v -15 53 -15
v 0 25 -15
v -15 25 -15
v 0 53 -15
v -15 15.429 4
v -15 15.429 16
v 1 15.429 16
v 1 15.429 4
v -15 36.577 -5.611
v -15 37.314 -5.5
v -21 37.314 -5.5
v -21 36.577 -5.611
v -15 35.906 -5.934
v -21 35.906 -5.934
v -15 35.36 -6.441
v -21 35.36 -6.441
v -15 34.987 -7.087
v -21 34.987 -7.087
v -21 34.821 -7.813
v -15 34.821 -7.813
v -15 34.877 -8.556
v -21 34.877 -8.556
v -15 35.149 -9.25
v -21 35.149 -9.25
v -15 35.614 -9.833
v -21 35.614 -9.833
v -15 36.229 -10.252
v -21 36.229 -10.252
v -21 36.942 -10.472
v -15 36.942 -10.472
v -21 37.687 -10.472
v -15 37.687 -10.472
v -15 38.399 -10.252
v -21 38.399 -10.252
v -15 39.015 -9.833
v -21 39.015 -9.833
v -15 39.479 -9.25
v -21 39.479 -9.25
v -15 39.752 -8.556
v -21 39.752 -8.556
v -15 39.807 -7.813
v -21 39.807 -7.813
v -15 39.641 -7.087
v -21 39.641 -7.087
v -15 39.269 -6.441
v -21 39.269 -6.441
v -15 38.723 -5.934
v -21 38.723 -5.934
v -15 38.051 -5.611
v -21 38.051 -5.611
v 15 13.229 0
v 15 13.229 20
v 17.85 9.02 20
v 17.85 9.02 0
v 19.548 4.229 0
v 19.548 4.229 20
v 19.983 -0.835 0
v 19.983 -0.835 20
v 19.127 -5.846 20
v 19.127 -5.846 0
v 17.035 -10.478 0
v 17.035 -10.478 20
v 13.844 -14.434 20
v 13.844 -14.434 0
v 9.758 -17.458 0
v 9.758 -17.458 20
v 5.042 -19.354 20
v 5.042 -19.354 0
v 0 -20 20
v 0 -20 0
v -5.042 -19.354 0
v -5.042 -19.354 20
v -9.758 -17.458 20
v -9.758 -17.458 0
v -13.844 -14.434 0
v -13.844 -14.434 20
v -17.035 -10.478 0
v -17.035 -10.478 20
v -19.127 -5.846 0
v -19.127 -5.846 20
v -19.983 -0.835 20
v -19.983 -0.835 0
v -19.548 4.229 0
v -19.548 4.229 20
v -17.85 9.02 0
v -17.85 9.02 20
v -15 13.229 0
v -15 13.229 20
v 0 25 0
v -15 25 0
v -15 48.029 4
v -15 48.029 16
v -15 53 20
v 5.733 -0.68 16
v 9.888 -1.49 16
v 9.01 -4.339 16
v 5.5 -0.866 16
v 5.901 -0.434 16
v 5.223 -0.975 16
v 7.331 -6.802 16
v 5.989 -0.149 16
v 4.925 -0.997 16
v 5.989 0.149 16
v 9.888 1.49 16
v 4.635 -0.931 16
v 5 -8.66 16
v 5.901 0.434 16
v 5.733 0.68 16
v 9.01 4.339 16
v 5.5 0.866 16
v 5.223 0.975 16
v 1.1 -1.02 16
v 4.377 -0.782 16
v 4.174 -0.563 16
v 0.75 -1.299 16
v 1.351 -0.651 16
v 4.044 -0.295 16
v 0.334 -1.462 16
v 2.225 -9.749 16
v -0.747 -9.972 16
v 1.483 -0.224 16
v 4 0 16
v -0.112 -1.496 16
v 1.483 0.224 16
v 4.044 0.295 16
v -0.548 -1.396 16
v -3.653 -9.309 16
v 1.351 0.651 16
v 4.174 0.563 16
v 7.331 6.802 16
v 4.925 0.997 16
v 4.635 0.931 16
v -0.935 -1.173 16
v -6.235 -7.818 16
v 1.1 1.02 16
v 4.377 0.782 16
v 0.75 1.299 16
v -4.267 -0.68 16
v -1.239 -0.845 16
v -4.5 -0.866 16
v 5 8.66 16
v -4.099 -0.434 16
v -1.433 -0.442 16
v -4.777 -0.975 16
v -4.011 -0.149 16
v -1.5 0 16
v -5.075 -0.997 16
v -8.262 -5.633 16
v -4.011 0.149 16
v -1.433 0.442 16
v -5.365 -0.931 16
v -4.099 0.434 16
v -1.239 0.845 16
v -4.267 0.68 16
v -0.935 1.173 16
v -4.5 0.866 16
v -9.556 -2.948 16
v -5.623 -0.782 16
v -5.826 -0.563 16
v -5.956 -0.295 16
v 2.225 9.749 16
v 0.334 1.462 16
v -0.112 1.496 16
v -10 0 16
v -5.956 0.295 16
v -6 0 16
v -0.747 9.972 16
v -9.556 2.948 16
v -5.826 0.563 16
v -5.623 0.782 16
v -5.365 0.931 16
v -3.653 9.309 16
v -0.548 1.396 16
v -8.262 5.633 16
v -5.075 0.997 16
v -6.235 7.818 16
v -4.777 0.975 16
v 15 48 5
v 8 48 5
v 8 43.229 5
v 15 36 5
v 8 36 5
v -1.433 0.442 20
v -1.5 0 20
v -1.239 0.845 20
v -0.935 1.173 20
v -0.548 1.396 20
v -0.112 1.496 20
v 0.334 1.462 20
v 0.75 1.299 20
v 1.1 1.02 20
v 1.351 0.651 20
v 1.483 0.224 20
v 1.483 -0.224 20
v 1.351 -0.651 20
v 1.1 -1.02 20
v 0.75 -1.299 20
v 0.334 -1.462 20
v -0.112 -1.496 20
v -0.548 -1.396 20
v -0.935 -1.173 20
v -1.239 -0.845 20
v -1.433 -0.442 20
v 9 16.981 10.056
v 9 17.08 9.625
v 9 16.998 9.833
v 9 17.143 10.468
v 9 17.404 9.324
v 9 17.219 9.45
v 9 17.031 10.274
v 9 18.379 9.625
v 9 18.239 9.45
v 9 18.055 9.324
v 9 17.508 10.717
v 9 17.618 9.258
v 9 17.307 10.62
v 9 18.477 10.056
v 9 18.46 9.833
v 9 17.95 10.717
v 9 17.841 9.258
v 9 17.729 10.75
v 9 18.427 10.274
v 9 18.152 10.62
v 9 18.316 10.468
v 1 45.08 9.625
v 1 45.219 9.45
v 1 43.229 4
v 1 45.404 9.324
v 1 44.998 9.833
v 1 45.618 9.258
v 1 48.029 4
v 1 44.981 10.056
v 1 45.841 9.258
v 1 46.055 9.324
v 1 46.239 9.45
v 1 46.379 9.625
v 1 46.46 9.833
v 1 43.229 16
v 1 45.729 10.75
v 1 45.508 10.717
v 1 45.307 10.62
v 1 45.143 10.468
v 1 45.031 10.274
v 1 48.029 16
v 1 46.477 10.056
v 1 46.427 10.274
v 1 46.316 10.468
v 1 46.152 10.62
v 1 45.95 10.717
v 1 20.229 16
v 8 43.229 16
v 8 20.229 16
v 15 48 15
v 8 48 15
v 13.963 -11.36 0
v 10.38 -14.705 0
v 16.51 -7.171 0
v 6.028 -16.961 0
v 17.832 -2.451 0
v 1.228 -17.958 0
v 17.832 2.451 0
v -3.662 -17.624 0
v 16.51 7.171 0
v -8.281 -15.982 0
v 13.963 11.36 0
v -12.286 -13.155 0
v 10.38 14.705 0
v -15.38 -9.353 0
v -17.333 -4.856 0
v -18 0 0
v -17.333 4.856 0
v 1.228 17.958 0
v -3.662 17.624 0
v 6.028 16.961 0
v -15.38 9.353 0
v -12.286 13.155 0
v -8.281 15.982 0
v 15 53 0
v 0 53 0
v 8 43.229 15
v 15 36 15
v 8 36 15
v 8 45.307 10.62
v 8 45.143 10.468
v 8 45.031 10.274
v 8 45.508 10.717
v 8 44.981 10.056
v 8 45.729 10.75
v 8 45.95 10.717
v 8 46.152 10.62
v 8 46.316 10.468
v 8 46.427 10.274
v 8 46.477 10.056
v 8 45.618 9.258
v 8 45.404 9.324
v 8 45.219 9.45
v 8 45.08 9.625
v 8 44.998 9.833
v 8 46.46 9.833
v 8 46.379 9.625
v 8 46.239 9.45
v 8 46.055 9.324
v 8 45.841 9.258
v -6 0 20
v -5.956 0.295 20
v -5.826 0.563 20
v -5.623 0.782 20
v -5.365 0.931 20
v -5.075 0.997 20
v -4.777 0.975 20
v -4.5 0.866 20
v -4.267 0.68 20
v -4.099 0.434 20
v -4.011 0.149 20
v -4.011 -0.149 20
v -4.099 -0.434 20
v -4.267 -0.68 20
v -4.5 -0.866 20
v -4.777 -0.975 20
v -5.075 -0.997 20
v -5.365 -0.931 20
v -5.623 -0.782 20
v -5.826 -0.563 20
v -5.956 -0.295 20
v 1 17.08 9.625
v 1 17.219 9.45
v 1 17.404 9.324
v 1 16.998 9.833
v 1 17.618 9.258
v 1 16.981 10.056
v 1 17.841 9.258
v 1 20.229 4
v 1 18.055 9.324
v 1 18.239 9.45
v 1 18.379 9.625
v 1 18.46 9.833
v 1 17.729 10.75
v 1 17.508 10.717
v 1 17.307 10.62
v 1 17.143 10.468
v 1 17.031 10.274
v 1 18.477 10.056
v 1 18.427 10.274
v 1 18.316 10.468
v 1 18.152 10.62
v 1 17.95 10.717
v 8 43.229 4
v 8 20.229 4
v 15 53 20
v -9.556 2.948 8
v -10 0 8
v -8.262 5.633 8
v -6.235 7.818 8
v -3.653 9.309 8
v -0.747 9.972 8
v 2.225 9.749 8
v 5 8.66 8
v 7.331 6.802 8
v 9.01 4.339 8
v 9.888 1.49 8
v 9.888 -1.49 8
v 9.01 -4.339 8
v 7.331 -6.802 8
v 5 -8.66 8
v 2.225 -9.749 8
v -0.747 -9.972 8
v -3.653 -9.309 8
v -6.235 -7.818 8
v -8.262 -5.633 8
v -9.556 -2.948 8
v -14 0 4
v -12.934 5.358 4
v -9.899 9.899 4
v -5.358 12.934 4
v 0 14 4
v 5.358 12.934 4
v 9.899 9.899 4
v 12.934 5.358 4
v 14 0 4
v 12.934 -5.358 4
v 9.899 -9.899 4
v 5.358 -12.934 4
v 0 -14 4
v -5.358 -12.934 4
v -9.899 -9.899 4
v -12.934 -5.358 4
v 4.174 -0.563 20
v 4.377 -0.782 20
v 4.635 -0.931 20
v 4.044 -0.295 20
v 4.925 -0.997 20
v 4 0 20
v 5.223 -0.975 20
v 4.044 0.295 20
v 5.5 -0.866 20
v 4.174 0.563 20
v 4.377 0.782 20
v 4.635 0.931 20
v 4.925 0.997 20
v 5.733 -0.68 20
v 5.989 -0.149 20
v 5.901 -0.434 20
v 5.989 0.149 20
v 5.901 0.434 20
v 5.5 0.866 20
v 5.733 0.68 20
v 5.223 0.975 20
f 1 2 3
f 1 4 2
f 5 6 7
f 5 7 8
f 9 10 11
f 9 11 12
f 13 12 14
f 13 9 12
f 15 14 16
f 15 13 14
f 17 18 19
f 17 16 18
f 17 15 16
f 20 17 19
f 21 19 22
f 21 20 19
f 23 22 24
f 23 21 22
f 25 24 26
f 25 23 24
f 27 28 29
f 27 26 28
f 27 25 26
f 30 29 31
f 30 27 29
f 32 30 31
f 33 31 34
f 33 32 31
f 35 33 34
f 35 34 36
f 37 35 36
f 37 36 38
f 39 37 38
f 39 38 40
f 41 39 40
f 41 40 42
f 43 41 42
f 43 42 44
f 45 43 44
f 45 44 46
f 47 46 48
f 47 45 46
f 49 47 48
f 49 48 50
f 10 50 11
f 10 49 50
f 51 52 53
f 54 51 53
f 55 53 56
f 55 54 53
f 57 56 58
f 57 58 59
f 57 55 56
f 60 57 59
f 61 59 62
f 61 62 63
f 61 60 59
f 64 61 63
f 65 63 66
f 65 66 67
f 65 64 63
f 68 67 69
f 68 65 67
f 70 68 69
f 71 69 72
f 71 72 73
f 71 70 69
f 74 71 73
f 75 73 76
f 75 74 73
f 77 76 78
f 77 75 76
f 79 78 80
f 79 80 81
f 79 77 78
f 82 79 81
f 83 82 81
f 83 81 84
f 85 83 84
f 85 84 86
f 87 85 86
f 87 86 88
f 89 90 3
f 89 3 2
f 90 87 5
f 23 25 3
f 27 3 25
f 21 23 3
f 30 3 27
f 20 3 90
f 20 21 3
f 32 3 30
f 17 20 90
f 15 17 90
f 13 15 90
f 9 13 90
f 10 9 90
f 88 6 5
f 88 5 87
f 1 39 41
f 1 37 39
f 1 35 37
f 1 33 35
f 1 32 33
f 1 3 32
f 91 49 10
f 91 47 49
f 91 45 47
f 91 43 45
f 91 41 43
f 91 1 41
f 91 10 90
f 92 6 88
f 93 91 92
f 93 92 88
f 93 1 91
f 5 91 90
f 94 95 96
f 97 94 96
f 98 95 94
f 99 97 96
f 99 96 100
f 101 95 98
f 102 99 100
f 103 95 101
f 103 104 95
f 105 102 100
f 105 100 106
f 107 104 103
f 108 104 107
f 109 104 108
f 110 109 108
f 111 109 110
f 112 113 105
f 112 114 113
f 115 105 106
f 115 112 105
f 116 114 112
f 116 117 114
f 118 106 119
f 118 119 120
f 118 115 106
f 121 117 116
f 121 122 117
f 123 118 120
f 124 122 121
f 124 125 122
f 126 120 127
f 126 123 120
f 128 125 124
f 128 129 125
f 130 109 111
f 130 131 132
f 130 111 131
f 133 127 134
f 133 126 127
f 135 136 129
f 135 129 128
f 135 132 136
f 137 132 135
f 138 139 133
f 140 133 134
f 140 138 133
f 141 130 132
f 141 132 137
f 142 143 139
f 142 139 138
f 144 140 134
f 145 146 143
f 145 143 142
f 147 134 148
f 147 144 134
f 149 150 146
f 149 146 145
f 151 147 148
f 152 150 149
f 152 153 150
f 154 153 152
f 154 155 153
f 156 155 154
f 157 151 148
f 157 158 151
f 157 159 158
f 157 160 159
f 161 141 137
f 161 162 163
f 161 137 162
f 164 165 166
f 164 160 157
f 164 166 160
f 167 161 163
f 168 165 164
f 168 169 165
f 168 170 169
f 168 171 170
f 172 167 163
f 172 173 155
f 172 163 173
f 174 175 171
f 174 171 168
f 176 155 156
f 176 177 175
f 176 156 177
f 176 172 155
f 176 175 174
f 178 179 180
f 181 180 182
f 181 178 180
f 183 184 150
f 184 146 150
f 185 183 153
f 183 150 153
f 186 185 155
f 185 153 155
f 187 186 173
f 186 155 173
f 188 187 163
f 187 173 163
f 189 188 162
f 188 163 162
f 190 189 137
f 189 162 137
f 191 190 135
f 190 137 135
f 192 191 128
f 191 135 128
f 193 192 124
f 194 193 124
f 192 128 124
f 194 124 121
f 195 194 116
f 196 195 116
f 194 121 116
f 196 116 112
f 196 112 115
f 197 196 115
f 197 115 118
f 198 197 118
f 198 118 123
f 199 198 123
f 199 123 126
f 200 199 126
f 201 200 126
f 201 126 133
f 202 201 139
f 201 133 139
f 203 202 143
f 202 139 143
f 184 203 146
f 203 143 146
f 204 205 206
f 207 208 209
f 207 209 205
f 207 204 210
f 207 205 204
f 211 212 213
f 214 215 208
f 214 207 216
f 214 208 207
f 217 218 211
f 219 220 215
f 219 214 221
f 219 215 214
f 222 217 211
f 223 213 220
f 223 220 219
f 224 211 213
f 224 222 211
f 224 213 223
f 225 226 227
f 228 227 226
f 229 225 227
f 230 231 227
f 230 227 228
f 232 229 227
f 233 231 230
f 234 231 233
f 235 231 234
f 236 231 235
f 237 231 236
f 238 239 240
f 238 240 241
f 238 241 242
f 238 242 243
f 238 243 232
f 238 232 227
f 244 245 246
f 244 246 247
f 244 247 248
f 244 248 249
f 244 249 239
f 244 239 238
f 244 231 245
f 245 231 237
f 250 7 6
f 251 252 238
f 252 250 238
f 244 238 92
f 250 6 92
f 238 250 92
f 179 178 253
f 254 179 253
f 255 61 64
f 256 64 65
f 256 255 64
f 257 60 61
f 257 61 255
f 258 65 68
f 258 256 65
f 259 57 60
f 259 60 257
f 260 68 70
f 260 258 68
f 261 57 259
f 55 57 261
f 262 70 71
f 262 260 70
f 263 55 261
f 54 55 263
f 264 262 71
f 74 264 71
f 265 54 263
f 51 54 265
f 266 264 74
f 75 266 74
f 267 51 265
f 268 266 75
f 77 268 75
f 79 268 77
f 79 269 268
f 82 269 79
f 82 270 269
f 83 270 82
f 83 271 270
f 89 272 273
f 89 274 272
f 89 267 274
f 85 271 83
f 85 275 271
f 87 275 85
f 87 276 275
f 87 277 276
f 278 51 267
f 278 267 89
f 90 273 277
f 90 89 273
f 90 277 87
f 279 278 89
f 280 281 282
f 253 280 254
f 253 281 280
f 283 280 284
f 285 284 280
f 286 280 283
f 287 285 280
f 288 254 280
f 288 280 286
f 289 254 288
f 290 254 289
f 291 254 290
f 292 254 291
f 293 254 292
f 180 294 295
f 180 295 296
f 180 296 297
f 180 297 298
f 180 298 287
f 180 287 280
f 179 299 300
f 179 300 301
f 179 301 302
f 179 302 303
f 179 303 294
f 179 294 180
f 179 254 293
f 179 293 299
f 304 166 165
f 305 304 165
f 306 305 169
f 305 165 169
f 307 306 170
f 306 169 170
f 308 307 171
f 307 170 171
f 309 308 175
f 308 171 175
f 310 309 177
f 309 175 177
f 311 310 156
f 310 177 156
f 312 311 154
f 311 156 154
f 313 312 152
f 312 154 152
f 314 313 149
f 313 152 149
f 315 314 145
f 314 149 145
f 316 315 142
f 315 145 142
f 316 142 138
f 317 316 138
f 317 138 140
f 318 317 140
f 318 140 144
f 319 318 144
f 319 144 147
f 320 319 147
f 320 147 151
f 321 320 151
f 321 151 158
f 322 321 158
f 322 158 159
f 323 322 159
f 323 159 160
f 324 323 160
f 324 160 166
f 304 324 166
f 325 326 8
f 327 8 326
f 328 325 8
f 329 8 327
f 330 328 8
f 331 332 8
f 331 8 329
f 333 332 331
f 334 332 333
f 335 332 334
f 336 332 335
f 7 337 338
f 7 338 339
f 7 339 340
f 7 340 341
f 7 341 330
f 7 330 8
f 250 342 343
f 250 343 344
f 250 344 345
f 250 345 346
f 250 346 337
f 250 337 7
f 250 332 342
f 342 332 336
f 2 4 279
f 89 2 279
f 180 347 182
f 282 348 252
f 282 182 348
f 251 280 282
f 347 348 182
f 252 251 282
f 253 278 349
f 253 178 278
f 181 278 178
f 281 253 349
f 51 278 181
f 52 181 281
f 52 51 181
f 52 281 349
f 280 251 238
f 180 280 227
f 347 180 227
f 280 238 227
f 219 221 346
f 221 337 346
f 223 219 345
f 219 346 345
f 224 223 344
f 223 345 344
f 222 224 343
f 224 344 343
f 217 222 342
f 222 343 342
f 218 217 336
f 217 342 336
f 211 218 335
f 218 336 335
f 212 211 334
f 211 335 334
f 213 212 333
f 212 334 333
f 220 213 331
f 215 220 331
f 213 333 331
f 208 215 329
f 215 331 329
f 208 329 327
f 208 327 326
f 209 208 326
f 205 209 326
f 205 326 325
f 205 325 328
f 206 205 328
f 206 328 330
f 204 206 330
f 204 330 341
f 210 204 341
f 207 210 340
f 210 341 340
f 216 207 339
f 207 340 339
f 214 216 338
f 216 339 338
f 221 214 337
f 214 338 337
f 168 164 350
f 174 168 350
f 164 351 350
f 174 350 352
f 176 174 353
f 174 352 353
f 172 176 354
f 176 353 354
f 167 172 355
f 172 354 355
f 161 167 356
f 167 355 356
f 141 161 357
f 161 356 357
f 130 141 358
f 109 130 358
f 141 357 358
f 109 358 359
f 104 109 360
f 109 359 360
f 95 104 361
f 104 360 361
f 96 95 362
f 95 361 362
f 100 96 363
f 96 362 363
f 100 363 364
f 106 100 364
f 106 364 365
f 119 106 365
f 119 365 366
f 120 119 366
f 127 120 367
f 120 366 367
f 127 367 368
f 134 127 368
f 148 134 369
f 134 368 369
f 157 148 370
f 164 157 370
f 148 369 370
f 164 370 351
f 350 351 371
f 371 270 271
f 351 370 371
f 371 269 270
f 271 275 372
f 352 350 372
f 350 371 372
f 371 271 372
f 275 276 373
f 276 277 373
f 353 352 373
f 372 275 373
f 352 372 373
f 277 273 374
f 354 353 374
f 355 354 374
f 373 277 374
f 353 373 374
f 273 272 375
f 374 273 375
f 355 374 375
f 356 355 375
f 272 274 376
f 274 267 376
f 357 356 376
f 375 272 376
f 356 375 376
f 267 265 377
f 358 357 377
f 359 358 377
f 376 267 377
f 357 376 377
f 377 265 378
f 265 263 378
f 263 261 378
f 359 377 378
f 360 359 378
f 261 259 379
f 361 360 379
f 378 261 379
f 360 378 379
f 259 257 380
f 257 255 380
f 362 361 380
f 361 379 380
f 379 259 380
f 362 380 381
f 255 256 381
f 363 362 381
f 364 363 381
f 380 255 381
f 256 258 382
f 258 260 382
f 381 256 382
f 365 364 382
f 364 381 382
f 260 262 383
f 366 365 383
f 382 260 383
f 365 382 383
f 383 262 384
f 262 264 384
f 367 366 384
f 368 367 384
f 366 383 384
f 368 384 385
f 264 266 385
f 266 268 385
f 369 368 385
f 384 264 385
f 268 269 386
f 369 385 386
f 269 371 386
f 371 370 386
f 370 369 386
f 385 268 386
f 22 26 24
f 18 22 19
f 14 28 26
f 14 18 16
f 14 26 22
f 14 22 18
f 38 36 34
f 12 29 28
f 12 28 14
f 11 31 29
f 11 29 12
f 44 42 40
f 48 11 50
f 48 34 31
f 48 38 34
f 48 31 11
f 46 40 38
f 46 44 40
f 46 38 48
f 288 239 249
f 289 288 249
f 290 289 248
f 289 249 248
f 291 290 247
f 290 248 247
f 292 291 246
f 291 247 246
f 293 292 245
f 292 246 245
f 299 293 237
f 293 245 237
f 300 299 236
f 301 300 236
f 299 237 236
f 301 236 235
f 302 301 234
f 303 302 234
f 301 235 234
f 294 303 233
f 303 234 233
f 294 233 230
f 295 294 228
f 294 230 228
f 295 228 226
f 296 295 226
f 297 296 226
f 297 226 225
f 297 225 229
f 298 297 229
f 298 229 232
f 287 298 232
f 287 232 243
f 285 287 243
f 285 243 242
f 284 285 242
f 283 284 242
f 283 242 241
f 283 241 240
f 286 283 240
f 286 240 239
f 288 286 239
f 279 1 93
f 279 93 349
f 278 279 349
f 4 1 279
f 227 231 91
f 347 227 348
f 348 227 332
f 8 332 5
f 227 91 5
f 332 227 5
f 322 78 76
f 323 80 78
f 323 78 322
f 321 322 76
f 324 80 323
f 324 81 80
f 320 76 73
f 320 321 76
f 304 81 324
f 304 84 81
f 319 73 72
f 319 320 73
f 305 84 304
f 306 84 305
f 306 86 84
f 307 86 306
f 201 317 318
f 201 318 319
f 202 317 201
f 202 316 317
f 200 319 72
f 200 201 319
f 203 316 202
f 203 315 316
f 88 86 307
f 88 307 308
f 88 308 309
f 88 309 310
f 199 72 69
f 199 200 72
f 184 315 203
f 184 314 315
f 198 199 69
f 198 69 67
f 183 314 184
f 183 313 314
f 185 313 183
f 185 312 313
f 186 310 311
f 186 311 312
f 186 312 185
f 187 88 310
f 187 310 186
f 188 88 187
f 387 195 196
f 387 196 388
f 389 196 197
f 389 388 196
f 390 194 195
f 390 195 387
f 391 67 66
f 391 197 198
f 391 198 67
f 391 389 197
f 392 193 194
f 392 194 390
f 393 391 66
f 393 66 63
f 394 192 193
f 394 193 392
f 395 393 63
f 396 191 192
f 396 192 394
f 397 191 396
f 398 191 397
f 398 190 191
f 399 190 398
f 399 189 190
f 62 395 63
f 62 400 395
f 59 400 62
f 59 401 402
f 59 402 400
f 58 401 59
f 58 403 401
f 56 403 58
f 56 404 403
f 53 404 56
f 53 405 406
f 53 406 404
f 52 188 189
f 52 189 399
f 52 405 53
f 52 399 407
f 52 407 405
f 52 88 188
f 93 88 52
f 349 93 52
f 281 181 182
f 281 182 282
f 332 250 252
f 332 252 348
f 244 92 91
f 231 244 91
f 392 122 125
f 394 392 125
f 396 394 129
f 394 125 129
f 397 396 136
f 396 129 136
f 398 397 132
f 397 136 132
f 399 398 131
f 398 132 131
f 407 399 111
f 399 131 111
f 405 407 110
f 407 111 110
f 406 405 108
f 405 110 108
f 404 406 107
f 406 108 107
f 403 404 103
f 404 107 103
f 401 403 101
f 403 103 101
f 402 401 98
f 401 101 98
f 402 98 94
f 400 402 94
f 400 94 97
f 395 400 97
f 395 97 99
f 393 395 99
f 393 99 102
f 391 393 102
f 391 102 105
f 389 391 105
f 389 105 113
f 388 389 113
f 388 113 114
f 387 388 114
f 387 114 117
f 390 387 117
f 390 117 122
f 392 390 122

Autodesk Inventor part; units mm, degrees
ref_plane "YZ Plane" through (0, 0, 0) normal (1, 0, 0) x (0, 1, 0)
ref_plane "XZ Plane" through (0, 0, 0) normal (0, 1, 0) x (-1, 0, 0)
ref_plane "XY Plane" through (0, 0, 0) normal (0, 0, 1) x (1, 0, 0)
sketch "Sketch1" plane through (0, 0, 0) normal (0, 0, 1) x (1, 0, 0)
  circle A0 centre (0, 0) radius 10
  circle A1 centre (0, 0) radius 20
  line L0 (-15, 0) -> (15, 0)
  line L1 (15, 0) -> (15, 50)
  line L2 (15, 50) -> (-15, 50)
  line L3 (-15, 50) -> (-15, 0)
  point P0 (-15, 13.2288)
  point P1 (15, 13.2288)
  dimension "d0" = 20
  dimension "d1" = 40
  dimension "d2" = 30
  dimension "d3" = 50
extrude "Extrusion1" add sketch "Sketch1" along normal blind 20
sketch "Sketch2" plane through (0, 0, 20) normal (0, 0, 1) x (1, 0, 0)
  circle A0 centre (0, 0) radius 10
  dimension "d6" = 20
extrude "Extrusion2" cut sketch "Sketch2" against normal blind 15
sketch "Sketch4" plane through (-15, 13.2288, 0) normal (-1, 0, 0) x (0, 0, 1)
  line L0 (0, 36.7712) -> (20, 36.7712) projected
  line L1 (0, 0) -> (0, 36.7712) projected
  line L2 (20, 36.7712) -> (0, 36.7712)
  line L3 (0, 36.7712) -> (0, 0)
  line L4 (0, 0) -> (20, 0)
  line L5 (20, 0) -> (20, 36.7712)
  line L6 (0, 0) -> (20, 0) projected
  line L7 (20, 36.7712) -> (10, 36.7712)
  line L8 (10, 36.7712) -> (10, 0)
  line L9 (10, 0) -> (20, 0)
  line L10 (20, 0) -> (20, 36.7712)
  line L11 (10, 0) -> (16, 0)
  line L12 (16, 0) -> (16, 25)
  line L13 (16, 25) -> (10, 25)
  line L14 (10, 25) -> (10, 0)
  line L15 (10, 25) -> (4, 25)
  line L16 (4, 25) -> (4, 0)
  line L17 (4, 0) -> (10, 0)
  line L18 (10, 0) -> (10, 25)
  line L19 (4, 25) -> (16, 25)
  line L20 (16, 25) -> (16, 30.0005)
  line L21 (16, 30.0005) -> (4, 30.0005)
  line L22 (4, 30.0005) -> (4, 25)
  line L23 (4, 30.0005) -> (16, 30.0005)
  line L24 (16, 30.0005) -> (16, 7.0005)
  line L25 (16, 7.0005) -> (4, 7.0005)
  line L26 (4, 7.0005) -> (4, 30.0005)
  line L27 (10, 7.0005) -> (16, 7.0005)
  line L28 (16, 7.0005) -> (16, 0)
  line L29 (16, 0) -> (10, 0)
  line L30 (10, 0) -> (10, 7.0005)
  point P0 (0, -13.2288)
  dimension "d13" = 6
  dimension "d14" = 25
  dimension "d15" = 6
  dimension "d16" = 23
extrude "Extrusion3" cut sketch "Sketch4" against normal blind 23 contours L21 L20 L13 L8 | L8 L15 L22 L21 | L13 L12 L25 L8 | L8 L25 L16 L15
sketch "Sketch6" plane through (-15, 13.2288, 0) normal (-1, 0, 0) x (0, 0, 1)
  line L0 (4, 7.0005) -> (4, 30.0005) projected
  line L1 (4, 7.0005) -> (16, 7.0005)
  line L2 (16, 7.0005) -> (16, 2.2005)
  line L3 (16, 2.2005) -> (4, 2.2005)
  line L4 (4, 2.2005) -> (4, 7.0005)
  line L5 (4, 30.0005) -> (16, 30.0005)
  line L6 (16, 30.0005) -> (16, 34.8005)
  line L7 (16, 34.8005) -> (4, 34.8005)
  line L8 (4, 34.8005) -> (4, 30.0005)
  point P0 (0, -13.2288)
  dimension "d19" = 12
  dimension "d20" = 4.8
  dimension "d21" = 4.8
extrude "Extrusion4" cut sketch "Sketch6" against normal blind 16
sketch "Sketch7" plane through (1, 13.2288, 0) normal (-1, 0, 0) x (0, 0, 1)
  line L0 (4, 30.0005) -> (16, 30.0005) projected
  line L1 (4, 30.0005) -> (10, 30.0005)
  line L2 (10, 30.0005) -> (10, 32.5005)
  line L3 (10, 32.5005) -> (4, 32.5005)
  line L4 (4, 32.5005) -> (4, 30.0005)
  circle A0 centre (10, 32.5005) radius 0.75
  line L5 (16, 7.0005) -> (4, 7.0005) projected
  line L6 (16, 7.0005) -> (16, 2.2005) projected
  line L7 (4, 7.0005) -> (16, 7.0005)
  line L8 (16, 7.0005) -> (16, 4.5005)
  line L9 (16, 4.5005) -> (4, 4.5005)
  line L10 (4, 4.5005) -> (4, 7.0005)
  line L11 (10, 4.5005) -> (4, 4.5005)
  line L12 (4, 4.5005) -> (4, 7.0005)
  line L13 (4, 7.0005) -> (10, 7.0005)
  line L14 (10, 7.0005) -> (10, 4.5005)
  circle A1 centre (10, 4.5005) radius 0.75
  point P0 (0, -13.2288)
  dimension "d24" = 2.5
  dimension "d25" = 1.5
  dimension "d26" = 2.5
  dimension "d27" = 1.5
extrude "Extrusion5" cut sketch "Sketch7" against normal blind 8 contours A0 L3 L2 | L2 L3 A0 | A1 L9 L14 | L14 L9 A1 | A1 L9
sketch "Sketch8" plane through (15, 13.2288, 0) normal (1, 0, 0) x (0, 0, -1)
  line L0 (0, 36.7712) -> (0, 0) projected
  line L1 (-20, 36.7712) -> (-20, 0) projected
  line L2 (0, 36.7712) -> (-20, 36.7712)
  line L3 (-20, 36.7712) -> (-20, 26.7712)
  line L4 (-20, 26.7712) -> (0, 26.7712)
  line L5 (0, 26.7712) -> (0, 36.7712)
  line L6 (0, 26.7712) -> (-20, 26.7712)
  line L7 (-20, 26.7712) -> (-20, 18.7712)
  line L8 (-20, 18.7712) -> (0, 18.7712)
  line L9 (0, 18.7712) -> (0, 26.7712)
  line L10 (0, 26.7712) -> (-10, 26.7712)
  line L11 (-10, 26.7712) -> (-10, 18.7712)
  line L12 (-10, 18.7712) -> (0, 18.7712)
  line L13 (0, 18.7712) -> (0, 26.7712)
  line L14 (-10, 26.7712) -> (-5, 26.7712)
  line L15 (-5, 26.7712) -> (-5, 22.7712)
  line L16 (-5, 22.7712) -> (-10, 22.7712)
  line L17 (-10, 22.7712) -> (-10, 26.7712)
  line L18 (-10, 22.7712) -> (-15, 22.7712)
  line L19 (-15, 22.7712) -> (-15, 26.7712)
  line L20 (-15, 26.7712) -> (-10, 26.7712)
  line L21 (-10, 26.7712) -> (-10, 22.7712)
  point P0 (0, -13.2288)
  dimension "d30" = 10
  dimension "d31" = 8
  dimension "d32" = 5
  dimension "d33" = 5
extrude "Extrusion6" cut sketch "Sketch8" against normal blind 15.8125 contours L15 L16 L11 L4 | L11 L18 L19 L4
sketch "Sketch9" plane through (0, 0, 5) normal (0, 0, 1) x (1, 0, 0)
  circle A0 centre (0, 0) radius 1
  circle A1 centre (7, 0) radius 1.5
  circle A2 centre (0, 0) radius 1.5
  circle A3 centre (-7, 0) radius 1.5
  dimension "d36" = 2
  dimension "d37" = 3
  dimension "d38" = 3
  dimension "d39" = 3
extrude "Extrusion7" cut sketch "Sketch9" against normal blind 8 contours A0 | A1 | A2 | A3
sketch "Sketch10" plane through (-15, 50, 0) normal (0, 1, 0) x (1, 0, 0)
  line L0 (0, 0) -> (0, -20) projected
  line L1 (0, 0) -> (29.4792, 0)
  line L2 (29.4792, 0) -> (29.4792, -20)
  line L3 (29.4792, -20) -> (0, -20)
  line L4 (0, -20) -> (0, 0)
  point P0 (15, 0)
extrude "Extrusion8" add sketch "Sketch10" along normal blind 10
sketch "Sketch11" plane through (0, 0, 0) normal (0, 0, -1) x (-1, 0, 0)
  line L0 (15, 13.2288) -> (15, 60) projected
  line L1 (-15, 13.2288) -> (-15, 50) projected
  line L2 (15, 60) -> (-15, 60)
  line L3 (-15, 60) -> (-15, 45)
  line L4 (-15, 45) -> (15, 45)
  line L5 (15, 45) -> (15, 60)
  line L6 (15, 45) -> (-15, 45)
  line L7 (-15, 45) -> (-15, 35)
  line L8 (-15, 35) -> (15, 35)
  line L9 (15, 35) -> (15, 45)
  point P0 (0, 0)
  dimension "d47" = 15
  dimension "d48" = 10
sketch "Sketch12" plane through (14.4792, 50, 20) normal (1, 0, 0) x (0, 0, -1)
  line L0 (20, 0) -> (20, 10) projected
  line L1 (0, 0) -> (20, 0)
  line L2 (20, 0) -> (20, 10)
  line L3 (20, 10) -> (0, 10)
  line L4 (0, 10) -> (0, 0)
  point P0 (20, -50)
extrude "Extrusion9" cut sketch "Sketch12" against normal blind 59.6125
sketch "Sketch13" plane through (-15, 50, 0) normal (0, 1, 0) x (1, 0, 0)
  line L0 (30, 0) -> (30, -20) projected
  line L1 (0, 0) -> (30, 0)
  line L2 (30, 0) -> (30, -20)
  line L3 (30, -20) -> (0, -20)
  line L4 (0, -20) -> (0, 0)
  point P0 (15, 0)
extrude "Extrusion10" add sketch "Sketch13" along normal blind 10
extrude "Extrusion11" add sketch "Sketch11" along normal blind 10
sketch "Sketch15" plane through (0, 0, 20) normal (0, 0, 1) x (1, 0, 0)
  line L0 (-15, 60) -> (15, 60) projected
  line L1 (-15, 60) -> (0, 60)
  line L2 (0, 60) -> (0, 35)
  line L3 (0, 35) -> (-15, 35)
  line L4 (-15, 35) -> (-15, 60)
  point P0 (0, 0)
  dimension "d56" = 25
extrude "Extrusion12" add sketch "Sketch15" along normal blind 10
sketch "Sketch16" plane through (0, 0, -10) normal (0, 0, -1) x (-1, 0, 0)
  line L0 (-15, 13.2288) -> (-15, 60) projected
  line L1 (0, 35) -> (15, 35) projected
  line L2 (-15, 60) -> (0, 60)
  line L3 (0, 60) -> (0, 35)
  line L4 (0, 35) -> (-15, 35)
  line L5 (-15, 35) -> (-15, 60)
  point P0 (0, 0)
extrude "Extrusion13" cut sketch "Sketch16" against normal blind 10
sketch "Sketch18" plane through (0, 0, 20) normal (0, 0, 1) x (1, 0, 0)
  circle A0 centre (0, 0) radius 10
extrude "Extrusion15" add sketch "Sketch18" against normal blind 16
sketch "Sketch19" plane through (0, 0, 0) normal (0, 0, -1) x (-1, 0, 0)
  circle A0 centre (0, 0) radius 1.5 projected
  circle A1 centre (0, 0) radius 10
  dimension "d72" = 20
extrude "Extrusion16" cut sketch "Sketch19" against normal blind 16
sketch "Sketch20" plane through (0, 0, 4) normal (0, 0, -1) x (-1, 0, 0)
  circle A0 centre (0, 0) radius 1.5 projected
  circle A1 centre (0, 0) radius 1.5
extrude "Extrusion17" cut sketch "Sketch20" against normal blind 30.0375
sketch "Sketch21" plane through (0, 0, 16) normal (0, 0, -1) x (-1, 0, 0)
  circle A0 centre (5, 0) radius 1
  circle A1 centre (-5, 0) radius 1
  point P0 (0, 0)
  dimension "d77" = 2
  dimension "d78" = 2
extrude "Extrusion18" cut sketch "Sketch21" against normal blind 138.2375
chamfer "Chamfer2" distance 8 angle 45 1 edges at (10, 0, 0)
sketch "Sketch22" plane through (-15, 13.2288, 0) normal (-1, 0, 0) x (0, 0, 1)
  circle A0 centre (-4, 36.7712) radius 2 projected
  circle A1 centre (-4, 36.7712) radius 2
  circle A2 centre (24, 36.7712) radius 2 projected
  circle A3 centre (24, 36.7712) radius 2
  point P0 (0, -13.2288)
sketch "Sketch25" plane through (-15, 13.2288, 0) normal (-1, 0, 0) x (0, 0, 1)
  circle A0 centre (-4, 36.7712) radius 2 projected
  circle A1 centre (-4, 36.7712) radius 8
  arc A2 (7.7087, 23.1005) -> (12.2913, 23.1005) centre (10, 24.1005) ccw projected
  circle A3 centre (10, 24.1005) radius 8
  circle A4 centre (24, 36.7712) radius 2 projected
  circle A5 centre (24, 36.7712) radius 8
  circle A6 centre (-4, 36.7712) radius 2
  circle A7 centre (24, 36.7712) radius 2
  line L0 (-4, 36.7712) -> (24.7591, 36.7712)
  line L1 (24.7591, 36.7712) -> (24.7591, 61.7712)
  line L2 (24.7591, 61.7712) -> (-4, 61.7712)
  line L3 (-4, 61.7712) -> (-4, 36.7712)
  point P0 (0, -13.2288)
  dimension "d92" = 16
  dimension "d93" = 16
  dimension "d94" = 16
  dimension "d99" = 25
sketch "Sketch29" plane through (-15, 15.4292, 4) normal (0, 0, 1) x (1, 0, 0)
  point P0 (15, -15.4292)
sketch "Sketch33" plane through (15, 13.2288, 20) normal (1, 0, 0) x (0, 0, -1)
  line L0 (5, 26.7712) -> (5, 22.7712) projected
  line L1 (5, 26.7712) -> (15, 26.7712)
  line L2 (15, 26.7712) -> (15, 34.7712)
  line L3 (15, 34.7712) -> (5, 34.7712)
  line L4 (5, 34.7712) -> (5, 26.7712)
  point P0 (20, -13.2288)
  dimension "d110" = 10
  dimension "d111" = 8
extrude "Extrusion27" cut sketch "Sketch33" against normal blind 7
sketch "Sketch34" plane through (0, 0, 30) normal (0, 0, 1) x (1, 0, 0)
  point P0 (0, 0)
sketch "Sketch37" plane through (0, 0, 30) normal (0, 0, 1) x (1, 0, 0)
  point P0 (0, 0)
sketch "Sketch38" plane through (-15, 13.2288, 0) normal (-1, 0, 0) x (0, 0, 1)
  point P0 (0, -13.2288)
sketch "Sketch41" plane through (-15, 13.2288, 0) normal (-1, 0, 0) x (0, 0, 1)
  line L0 (30, 21.7712) -> (30, 46.7712) projected
  line L1 (30, 21.7712) -> (20, 21.7712)
  line L2 (20, 21.7712) -> (20, 48.4389)
  line L3 (20, 48.4389) -> (30, 48.4389)
  line L4 (30, 48.4389) -> (30, 21.7712)
  point P0 (0, -13.2288)
extrude "Extrusion31" cut sketch "Sketch41" against normal blind 36.0375
sketch "Sketch42" plane through (0, 0, -10) normal (0, 0, -1) x (-1, 0, 0)
  line L0 (0, 35) -> (15, 35) projected
  line L1 (0, 60) -> (0, 35) projected
  line L2 (15, 35) -> (0, 35)
  line L3 (0, 35) -> (0, 60)
  line L4 (0, 60) -> (15, 60)
  line L5 (15, 60) -> (15, 35)
  point P0 (0, 0)
extrude "Extrusion32" add sketch "Sketch42" along normal blind 5
sketch "Sketch43" plane through (-15, 35, 0) normal (0, -1, 0) x (1, 0, 0)
  line L0 (15, -15) -> (15, 0) projected
  line L1 (0, 0) -> (15, 0) projected
  line L2 (15, -15) -> (0, -15)
  line L3 (0, -15) -> (0, 0)
  line L4 (0, 0) -> (15, 0)
  line L5 (15, 0) -> (15, -15)
extrude "Extrusion33" add sketch "Sketch43" along normal blind 10
sketch "Sketch44" plane through (-15, 13.2288, 0) normal (-1, 0, 0) x (0, 0, 1)
  line L0 (16, 2.2005) -> (4, 2.2005) projected
  line L1 (10, 2.2005) -> (10, 34.6918)
  circle A0 centre (10, 24.0854) radius 8
  line L2 (10, 24.0854) -> (-8, 24.0854)
  circle A1 centre (-8, 24.0854) radius 8
  circle A2 centre (-8, 24.0854) radius 2.5
  point P0 (0, -13.2288)
  dimension "d128" = 16
  dimension "d129" = 18
  dimension "d130" = 16
  dimension "d131" = 5
extrude "Extrusion34" add sketch "Sketch44" along normal blind 6 contours A2
sketch "Sketch45" plane through (-15, 60, 0) normal (0, 1, 0) x (1, 0, 0)
  line L0 (0, 0) -> (0, 15) projected
  line L1 (0, -20) -> (30, -20) projected
  line L2 (0, 15) -> (15, 15)
  line L3 (15, 15) -> (15, -20)
  line L4 (15, -20) -> (0, -20)
  line L5 (0, -20) -> (0, 15)
  line L6 (30, -20) -> (30, 0) projected
  line L7 (15, 0) -> (30, 0)
  line L8 (30, 0) -> (30, -20)
  line L9 (30, -20) -> (15, -20)
  line L10 (15, -20) -> (15, 0)
extrude "Extrusion35" cut sketch "Sketch45" against normal blind 7
properties part number "NeWConcept"
